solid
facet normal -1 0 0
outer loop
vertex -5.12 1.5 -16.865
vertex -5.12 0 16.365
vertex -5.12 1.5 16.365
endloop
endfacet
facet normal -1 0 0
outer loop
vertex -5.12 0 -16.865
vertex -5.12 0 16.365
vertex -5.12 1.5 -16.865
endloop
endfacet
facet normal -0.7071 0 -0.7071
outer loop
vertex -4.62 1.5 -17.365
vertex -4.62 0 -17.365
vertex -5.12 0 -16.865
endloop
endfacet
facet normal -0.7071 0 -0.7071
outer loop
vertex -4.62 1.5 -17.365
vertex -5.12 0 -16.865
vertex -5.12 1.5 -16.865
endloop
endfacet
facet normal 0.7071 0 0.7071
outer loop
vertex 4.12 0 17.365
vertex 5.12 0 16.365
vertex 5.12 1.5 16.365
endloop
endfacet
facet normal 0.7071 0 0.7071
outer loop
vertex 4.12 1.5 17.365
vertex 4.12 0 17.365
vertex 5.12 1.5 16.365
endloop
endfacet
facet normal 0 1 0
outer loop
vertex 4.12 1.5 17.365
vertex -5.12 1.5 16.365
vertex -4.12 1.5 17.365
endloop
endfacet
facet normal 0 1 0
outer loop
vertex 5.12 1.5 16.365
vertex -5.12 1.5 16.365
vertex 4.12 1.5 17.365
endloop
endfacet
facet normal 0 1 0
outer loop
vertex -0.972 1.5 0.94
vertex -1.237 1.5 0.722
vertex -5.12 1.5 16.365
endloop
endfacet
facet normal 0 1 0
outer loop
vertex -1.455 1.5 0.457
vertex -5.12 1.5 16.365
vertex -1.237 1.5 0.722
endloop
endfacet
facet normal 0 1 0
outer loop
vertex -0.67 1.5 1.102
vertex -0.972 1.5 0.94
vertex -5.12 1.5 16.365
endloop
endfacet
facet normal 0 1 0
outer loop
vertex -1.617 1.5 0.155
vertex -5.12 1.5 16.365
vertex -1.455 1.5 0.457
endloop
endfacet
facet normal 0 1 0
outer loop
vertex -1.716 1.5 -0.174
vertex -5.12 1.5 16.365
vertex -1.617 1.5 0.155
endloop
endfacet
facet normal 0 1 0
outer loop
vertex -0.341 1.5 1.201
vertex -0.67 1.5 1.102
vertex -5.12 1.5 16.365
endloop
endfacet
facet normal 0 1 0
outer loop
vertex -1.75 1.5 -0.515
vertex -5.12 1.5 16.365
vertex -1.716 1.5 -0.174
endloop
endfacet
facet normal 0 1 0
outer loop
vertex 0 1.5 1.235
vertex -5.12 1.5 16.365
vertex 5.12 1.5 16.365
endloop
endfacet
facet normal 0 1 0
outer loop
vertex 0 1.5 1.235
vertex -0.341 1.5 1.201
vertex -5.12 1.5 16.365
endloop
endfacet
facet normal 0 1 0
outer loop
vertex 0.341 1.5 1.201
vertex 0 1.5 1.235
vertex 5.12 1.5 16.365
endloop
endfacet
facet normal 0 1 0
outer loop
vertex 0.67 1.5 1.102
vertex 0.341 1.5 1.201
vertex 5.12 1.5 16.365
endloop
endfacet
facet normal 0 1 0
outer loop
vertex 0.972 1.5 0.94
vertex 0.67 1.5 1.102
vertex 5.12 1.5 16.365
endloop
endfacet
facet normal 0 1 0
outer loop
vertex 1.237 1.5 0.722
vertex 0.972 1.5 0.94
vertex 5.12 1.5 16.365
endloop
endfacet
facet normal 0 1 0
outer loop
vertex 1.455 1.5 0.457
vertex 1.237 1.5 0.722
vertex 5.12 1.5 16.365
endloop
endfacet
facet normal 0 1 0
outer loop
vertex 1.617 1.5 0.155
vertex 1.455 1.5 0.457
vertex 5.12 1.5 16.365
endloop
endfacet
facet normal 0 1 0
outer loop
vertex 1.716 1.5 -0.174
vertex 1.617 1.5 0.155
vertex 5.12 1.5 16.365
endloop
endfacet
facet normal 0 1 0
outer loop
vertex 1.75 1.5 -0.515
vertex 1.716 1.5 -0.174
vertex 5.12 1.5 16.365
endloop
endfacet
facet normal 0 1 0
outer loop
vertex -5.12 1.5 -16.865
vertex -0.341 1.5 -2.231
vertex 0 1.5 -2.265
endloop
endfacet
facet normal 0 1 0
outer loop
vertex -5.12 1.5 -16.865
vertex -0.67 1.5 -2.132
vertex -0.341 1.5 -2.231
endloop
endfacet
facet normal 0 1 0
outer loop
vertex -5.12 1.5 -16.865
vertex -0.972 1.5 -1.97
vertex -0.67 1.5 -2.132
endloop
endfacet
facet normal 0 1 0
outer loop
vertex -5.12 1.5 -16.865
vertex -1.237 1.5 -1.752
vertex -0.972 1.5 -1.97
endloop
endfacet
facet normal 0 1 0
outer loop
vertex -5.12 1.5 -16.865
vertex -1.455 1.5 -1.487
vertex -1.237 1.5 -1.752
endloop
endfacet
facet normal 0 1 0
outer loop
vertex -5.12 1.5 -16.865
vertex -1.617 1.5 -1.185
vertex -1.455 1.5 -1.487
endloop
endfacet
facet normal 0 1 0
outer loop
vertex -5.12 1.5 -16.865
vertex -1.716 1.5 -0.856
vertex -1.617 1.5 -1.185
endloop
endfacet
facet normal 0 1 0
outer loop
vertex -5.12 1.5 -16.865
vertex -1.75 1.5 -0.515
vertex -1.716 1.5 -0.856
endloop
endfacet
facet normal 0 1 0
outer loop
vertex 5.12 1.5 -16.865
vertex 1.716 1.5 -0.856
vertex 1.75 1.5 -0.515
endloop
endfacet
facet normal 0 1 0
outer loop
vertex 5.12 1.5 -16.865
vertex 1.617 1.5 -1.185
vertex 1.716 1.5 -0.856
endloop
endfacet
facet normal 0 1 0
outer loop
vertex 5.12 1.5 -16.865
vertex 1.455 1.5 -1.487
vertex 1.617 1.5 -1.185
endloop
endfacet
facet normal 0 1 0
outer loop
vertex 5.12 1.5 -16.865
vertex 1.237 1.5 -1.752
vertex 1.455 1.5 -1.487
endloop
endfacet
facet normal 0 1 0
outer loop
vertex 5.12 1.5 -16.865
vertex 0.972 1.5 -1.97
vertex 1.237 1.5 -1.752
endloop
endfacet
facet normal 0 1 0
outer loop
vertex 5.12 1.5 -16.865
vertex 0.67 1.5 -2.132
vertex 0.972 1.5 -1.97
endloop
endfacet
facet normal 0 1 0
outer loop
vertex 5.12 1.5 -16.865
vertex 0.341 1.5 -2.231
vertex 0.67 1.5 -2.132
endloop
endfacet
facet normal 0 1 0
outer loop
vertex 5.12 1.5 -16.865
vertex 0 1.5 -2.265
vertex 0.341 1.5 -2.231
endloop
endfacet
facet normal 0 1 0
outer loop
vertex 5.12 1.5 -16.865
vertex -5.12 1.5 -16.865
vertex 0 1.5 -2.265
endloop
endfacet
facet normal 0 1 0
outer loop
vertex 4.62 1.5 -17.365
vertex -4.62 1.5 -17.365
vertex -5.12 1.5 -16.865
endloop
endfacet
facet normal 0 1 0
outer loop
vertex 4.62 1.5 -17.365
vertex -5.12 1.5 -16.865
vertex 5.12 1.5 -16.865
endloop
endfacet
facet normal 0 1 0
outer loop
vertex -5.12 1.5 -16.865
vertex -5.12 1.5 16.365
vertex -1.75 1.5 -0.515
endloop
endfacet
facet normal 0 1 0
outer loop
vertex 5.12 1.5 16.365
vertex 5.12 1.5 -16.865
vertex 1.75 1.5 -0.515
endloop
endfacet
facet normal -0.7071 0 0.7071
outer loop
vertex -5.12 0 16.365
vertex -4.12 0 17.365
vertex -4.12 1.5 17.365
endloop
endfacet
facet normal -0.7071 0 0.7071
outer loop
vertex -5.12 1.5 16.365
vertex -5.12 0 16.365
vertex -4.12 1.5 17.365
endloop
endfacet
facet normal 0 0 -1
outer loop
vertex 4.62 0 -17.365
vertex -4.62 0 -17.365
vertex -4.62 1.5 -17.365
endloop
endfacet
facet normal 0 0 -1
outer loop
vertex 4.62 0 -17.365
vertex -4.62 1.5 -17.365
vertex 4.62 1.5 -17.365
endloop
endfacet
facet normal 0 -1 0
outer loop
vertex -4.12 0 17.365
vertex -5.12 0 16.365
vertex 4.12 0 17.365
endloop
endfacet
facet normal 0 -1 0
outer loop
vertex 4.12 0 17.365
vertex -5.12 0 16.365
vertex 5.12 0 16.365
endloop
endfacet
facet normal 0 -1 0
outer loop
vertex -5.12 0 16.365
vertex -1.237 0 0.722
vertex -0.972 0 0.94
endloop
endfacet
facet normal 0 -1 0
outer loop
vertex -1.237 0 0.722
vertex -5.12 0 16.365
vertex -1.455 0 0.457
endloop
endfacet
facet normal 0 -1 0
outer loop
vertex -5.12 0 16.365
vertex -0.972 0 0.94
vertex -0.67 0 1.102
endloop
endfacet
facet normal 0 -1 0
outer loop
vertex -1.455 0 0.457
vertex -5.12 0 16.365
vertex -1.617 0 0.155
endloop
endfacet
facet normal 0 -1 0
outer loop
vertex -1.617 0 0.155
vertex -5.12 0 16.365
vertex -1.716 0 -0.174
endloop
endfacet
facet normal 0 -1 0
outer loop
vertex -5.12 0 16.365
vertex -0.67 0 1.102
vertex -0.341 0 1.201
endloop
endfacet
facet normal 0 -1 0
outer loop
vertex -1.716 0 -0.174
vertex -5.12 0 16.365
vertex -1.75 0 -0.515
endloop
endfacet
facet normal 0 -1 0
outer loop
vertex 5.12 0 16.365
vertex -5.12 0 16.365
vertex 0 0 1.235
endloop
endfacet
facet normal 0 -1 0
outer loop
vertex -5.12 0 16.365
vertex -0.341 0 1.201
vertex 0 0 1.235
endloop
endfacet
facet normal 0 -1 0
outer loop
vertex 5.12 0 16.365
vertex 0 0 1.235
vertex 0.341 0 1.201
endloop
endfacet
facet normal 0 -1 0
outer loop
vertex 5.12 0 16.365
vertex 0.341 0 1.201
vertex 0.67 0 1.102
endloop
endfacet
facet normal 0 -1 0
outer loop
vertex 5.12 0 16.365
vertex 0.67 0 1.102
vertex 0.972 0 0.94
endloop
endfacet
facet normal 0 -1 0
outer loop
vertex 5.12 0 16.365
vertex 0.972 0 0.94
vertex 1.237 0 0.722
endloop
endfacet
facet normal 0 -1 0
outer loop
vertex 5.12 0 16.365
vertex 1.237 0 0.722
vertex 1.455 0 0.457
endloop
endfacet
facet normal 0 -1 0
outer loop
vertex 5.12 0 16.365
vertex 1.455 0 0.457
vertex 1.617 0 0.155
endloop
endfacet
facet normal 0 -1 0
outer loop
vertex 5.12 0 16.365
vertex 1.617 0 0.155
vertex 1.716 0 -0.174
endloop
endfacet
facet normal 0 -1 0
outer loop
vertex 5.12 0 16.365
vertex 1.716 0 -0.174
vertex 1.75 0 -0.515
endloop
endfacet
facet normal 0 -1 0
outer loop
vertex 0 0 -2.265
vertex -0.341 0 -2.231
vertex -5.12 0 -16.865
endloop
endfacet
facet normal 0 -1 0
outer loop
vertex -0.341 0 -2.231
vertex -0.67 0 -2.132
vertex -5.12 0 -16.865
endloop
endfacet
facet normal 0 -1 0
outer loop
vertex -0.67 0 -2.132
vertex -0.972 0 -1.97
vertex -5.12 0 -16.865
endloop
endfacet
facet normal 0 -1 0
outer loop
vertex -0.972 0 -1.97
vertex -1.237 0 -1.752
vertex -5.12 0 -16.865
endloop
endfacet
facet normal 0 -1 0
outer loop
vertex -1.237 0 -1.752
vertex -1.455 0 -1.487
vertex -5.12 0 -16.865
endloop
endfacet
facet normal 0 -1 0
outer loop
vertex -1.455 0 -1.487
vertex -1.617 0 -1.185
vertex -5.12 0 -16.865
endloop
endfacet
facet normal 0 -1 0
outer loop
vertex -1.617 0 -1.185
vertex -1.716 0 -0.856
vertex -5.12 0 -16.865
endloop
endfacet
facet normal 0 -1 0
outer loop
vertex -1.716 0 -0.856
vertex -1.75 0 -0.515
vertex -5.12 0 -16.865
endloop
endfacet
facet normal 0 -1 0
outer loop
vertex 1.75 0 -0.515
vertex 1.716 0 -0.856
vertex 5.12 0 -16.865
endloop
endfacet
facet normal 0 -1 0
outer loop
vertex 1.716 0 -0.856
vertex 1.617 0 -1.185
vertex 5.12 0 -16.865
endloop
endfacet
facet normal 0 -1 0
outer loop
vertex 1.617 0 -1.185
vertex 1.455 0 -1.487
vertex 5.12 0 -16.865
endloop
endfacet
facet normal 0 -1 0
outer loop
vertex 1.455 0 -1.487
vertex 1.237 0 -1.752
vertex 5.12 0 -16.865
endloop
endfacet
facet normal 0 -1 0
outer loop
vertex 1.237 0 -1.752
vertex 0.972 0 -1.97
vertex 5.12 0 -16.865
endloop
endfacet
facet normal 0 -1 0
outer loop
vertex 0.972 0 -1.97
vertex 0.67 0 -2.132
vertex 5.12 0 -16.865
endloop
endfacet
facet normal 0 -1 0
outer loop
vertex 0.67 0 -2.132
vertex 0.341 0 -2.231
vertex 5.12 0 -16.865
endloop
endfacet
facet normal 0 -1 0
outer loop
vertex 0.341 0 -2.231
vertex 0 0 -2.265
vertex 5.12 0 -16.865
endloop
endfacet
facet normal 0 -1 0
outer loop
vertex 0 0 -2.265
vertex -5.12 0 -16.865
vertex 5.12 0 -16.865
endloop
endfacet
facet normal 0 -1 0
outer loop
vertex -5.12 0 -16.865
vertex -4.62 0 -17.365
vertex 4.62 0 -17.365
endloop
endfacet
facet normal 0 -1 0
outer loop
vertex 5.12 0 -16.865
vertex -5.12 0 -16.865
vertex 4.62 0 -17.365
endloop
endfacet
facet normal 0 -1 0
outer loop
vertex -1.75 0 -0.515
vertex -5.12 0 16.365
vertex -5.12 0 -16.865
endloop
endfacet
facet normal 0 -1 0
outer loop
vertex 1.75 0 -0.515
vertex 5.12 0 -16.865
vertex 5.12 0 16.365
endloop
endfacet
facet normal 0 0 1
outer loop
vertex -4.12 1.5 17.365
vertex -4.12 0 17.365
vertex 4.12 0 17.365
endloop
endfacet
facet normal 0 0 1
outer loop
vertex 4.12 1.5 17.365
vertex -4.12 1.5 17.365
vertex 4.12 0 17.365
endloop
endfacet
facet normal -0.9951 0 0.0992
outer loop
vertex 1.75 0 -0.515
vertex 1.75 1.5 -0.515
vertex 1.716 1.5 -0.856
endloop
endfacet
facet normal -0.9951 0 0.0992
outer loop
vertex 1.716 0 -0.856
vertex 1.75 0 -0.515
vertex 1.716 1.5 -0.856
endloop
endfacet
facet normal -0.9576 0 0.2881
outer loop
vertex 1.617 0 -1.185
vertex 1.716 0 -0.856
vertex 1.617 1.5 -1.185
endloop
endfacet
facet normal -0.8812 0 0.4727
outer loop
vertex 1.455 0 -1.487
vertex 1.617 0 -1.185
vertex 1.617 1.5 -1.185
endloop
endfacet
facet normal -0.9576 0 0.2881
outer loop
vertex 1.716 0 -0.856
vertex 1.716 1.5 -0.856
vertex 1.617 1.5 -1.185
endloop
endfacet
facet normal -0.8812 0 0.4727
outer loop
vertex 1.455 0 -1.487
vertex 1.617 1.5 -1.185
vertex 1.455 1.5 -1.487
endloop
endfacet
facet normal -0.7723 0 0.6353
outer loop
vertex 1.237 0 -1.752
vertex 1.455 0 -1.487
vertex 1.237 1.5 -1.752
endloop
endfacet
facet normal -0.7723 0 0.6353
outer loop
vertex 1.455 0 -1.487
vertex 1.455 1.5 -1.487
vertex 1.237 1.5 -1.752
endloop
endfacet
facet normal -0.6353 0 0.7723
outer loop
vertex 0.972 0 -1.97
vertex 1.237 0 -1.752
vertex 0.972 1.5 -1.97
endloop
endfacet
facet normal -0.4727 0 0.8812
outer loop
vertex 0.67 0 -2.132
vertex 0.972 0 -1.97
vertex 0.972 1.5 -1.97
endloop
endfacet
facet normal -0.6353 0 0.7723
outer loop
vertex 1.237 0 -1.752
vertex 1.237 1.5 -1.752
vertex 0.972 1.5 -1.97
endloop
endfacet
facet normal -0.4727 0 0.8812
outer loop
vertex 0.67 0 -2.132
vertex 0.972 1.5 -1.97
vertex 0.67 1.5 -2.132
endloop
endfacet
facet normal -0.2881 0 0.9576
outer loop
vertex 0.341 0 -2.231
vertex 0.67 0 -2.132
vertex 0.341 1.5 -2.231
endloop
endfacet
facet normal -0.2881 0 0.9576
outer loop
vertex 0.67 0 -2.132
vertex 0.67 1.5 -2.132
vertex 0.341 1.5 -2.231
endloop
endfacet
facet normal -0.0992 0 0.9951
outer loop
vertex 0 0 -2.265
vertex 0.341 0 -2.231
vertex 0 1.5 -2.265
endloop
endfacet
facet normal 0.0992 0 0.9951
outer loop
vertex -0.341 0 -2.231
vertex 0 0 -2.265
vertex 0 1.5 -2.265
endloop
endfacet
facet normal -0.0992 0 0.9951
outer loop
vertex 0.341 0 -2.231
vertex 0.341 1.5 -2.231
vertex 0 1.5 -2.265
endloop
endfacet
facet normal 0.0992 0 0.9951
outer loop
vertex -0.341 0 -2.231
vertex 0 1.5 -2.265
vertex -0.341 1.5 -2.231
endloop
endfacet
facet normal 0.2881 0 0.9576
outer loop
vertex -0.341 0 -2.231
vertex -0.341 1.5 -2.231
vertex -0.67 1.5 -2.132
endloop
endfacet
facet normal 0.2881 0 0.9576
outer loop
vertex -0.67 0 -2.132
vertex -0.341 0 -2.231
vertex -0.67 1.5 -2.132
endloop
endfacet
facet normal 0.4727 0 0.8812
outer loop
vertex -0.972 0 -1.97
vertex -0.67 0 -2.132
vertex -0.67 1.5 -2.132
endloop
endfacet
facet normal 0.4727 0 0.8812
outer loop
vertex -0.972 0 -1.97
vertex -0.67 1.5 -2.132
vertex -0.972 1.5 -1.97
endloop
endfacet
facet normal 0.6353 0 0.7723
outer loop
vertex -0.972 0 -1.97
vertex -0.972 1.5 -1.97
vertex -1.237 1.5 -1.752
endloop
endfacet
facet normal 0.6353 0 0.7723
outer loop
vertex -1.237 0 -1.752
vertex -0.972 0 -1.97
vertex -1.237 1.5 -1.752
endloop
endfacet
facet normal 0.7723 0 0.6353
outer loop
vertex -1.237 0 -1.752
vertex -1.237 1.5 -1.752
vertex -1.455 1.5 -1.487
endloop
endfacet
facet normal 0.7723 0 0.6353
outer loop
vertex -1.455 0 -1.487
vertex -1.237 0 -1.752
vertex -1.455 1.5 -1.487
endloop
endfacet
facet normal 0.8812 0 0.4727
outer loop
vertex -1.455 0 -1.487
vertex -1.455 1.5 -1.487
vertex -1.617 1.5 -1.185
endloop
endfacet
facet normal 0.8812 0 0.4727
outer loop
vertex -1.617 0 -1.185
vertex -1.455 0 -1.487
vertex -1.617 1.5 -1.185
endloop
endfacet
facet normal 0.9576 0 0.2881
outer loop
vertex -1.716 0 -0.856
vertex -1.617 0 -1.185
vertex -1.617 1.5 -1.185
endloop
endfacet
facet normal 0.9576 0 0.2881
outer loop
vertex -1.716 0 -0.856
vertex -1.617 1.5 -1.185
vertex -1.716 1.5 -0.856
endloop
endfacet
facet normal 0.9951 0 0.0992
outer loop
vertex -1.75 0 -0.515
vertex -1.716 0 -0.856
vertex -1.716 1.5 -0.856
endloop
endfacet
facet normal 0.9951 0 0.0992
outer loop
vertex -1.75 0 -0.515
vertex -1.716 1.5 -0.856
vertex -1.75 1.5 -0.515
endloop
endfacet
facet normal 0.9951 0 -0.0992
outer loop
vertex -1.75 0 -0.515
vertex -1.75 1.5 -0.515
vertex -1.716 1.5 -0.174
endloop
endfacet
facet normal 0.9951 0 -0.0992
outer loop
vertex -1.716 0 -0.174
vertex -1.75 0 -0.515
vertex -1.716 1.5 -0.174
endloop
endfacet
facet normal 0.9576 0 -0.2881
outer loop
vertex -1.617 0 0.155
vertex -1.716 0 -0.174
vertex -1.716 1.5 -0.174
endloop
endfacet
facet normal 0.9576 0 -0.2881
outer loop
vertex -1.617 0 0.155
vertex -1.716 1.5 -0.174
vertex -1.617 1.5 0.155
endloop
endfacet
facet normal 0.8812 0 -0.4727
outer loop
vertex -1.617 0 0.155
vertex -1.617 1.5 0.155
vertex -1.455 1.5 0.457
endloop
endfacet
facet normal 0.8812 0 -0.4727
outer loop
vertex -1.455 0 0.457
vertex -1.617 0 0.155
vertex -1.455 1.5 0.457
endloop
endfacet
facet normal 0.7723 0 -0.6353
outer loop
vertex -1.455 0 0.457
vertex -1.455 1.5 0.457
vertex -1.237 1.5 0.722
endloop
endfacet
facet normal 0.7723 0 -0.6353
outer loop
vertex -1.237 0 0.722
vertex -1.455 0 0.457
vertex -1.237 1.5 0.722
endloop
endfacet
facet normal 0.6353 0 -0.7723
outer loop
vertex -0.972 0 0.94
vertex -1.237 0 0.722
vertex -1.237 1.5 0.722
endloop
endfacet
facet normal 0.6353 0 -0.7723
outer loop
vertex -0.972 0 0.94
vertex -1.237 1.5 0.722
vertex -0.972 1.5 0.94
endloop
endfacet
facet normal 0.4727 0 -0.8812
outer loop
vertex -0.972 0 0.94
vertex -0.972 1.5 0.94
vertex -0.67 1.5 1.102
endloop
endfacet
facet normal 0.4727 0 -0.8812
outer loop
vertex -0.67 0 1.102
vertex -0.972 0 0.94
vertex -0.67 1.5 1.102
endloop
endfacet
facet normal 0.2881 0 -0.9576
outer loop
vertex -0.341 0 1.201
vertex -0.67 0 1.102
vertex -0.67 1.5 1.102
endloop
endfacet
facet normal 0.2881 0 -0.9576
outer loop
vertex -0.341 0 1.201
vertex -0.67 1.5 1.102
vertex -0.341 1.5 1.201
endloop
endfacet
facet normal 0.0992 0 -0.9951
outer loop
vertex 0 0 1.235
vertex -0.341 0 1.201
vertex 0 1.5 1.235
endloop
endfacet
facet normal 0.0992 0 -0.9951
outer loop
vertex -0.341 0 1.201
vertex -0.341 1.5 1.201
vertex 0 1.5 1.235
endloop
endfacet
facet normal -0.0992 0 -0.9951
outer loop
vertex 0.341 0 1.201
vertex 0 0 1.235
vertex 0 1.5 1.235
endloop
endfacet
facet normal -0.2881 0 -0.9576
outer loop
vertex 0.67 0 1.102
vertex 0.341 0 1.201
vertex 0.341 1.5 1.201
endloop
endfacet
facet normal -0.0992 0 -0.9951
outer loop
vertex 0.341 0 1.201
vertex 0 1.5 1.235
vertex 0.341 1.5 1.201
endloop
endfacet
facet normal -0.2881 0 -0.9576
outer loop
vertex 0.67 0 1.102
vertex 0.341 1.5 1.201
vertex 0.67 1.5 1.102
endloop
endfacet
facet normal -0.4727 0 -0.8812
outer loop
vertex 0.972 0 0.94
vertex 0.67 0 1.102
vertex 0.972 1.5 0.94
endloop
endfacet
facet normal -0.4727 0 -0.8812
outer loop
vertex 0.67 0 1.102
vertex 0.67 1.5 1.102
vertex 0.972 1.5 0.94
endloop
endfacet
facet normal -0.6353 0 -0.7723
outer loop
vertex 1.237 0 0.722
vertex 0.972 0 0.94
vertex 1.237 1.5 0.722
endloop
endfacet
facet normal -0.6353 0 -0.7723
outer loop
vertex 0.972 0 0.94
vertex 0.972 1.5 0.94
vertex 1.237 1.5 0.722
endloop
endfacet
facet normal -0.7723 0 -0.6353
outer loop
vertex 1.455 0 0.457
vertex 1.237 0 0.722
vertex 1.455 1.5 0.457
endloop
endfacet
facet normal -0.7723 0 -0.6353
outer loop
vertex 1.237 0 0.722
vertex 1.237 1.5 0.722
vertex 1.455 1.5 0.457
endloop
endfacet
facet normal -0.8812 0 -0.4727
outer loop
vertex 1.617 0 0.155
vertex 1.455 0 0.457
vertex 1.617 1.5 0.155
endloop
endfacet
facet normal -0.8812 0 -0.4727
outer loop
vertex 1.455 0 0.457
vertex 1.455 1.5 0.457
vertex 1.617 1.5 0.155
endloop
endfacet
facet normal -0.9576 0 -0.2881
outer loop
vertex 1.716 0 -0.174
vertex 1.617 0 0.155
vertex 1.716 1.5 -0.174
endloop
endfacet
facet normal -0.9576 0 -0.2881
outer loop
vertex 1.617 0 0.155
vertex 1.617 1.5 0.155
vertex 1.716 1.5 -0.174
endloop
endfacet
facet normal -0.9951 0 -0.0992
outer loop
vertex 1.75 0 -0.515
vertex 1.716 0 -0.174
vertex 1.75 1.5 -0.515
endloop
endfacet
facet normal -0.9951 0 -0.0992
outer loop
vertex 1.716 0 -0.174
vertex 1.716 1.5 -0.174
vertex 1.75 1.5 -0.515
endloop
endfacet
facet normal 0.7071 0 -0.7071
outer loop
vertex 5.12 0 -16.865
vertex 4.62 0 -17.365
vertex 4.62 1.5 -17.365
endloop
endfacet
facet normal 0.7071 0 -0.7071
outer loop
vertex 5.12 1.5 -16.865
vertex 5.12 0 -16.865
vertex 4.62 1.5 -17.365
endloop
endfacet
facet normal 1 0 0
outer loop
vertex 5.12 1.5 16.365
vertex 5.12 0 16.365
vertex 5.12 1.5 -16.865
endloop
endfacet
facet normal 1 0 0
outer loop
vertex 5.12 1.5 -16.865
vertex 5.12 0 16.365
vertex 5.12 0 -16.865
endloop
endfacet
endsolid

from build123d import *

# Parameters (mm, degrees)
SKETCH1_W           = 10.24
SKETCH1_H           = 34.73
BOSS_EXTRUDE1_DEPTH = 1.5
CHAMFER1_SIZE       = 0.5
CHAMFER2_SIZE       = 1
SKETCH2_R           = 1.75
CUT_EXTRUDE1_DEPTH  = 2.5


with BuildPart() as part:
    # Sketch1 → Boss-Extrude1 (new body)
    with BuildSketch(Plane(origin=(0, 0, 0), x_dir=(1, 0, 0), z_dir=(0, 1, 0))):
        Rectangle(SKETCH1_W, SKETCH1_H)
    extrude(amount=BOSS_EXTRUDE1_DEPTH)

    # Chamfer1
    chamfer1_edges = [part.edges().sort_by_distance(p)[0] for p in [
        (-5.12, 0.75, -17.365),
        (5.12, 0.75, -17.365),
    ]]
    chamfer(chamfer1_edges, length=CHAMFER1_SIZE)

    # Chamfer2
    chamfer2_edges = [part.edges().sort_by_distance(p)[0] for p in [
        (5.12, 0.75, 17.365),
        (-5.12, 0.75, 17.365),
    ]]
    chamfer(chamfer2_edges, length=CHAMFER2_SIZE)

    # Sketch2 → Cut-Extrude1 (cut, through all)
    with BuildSketch(Plane(origin=(0, 1.5, 0), x_dir=(1, 0, 0), z_dir=(0, 1, 0))):
        with Locations((0, 0.515)):
            Circle(SKETCH2_R)
    extrude(amount=-CUT_EXTRUDE1_DEPTH, mode=Mode.SUBTRACT)


solid = part.part
